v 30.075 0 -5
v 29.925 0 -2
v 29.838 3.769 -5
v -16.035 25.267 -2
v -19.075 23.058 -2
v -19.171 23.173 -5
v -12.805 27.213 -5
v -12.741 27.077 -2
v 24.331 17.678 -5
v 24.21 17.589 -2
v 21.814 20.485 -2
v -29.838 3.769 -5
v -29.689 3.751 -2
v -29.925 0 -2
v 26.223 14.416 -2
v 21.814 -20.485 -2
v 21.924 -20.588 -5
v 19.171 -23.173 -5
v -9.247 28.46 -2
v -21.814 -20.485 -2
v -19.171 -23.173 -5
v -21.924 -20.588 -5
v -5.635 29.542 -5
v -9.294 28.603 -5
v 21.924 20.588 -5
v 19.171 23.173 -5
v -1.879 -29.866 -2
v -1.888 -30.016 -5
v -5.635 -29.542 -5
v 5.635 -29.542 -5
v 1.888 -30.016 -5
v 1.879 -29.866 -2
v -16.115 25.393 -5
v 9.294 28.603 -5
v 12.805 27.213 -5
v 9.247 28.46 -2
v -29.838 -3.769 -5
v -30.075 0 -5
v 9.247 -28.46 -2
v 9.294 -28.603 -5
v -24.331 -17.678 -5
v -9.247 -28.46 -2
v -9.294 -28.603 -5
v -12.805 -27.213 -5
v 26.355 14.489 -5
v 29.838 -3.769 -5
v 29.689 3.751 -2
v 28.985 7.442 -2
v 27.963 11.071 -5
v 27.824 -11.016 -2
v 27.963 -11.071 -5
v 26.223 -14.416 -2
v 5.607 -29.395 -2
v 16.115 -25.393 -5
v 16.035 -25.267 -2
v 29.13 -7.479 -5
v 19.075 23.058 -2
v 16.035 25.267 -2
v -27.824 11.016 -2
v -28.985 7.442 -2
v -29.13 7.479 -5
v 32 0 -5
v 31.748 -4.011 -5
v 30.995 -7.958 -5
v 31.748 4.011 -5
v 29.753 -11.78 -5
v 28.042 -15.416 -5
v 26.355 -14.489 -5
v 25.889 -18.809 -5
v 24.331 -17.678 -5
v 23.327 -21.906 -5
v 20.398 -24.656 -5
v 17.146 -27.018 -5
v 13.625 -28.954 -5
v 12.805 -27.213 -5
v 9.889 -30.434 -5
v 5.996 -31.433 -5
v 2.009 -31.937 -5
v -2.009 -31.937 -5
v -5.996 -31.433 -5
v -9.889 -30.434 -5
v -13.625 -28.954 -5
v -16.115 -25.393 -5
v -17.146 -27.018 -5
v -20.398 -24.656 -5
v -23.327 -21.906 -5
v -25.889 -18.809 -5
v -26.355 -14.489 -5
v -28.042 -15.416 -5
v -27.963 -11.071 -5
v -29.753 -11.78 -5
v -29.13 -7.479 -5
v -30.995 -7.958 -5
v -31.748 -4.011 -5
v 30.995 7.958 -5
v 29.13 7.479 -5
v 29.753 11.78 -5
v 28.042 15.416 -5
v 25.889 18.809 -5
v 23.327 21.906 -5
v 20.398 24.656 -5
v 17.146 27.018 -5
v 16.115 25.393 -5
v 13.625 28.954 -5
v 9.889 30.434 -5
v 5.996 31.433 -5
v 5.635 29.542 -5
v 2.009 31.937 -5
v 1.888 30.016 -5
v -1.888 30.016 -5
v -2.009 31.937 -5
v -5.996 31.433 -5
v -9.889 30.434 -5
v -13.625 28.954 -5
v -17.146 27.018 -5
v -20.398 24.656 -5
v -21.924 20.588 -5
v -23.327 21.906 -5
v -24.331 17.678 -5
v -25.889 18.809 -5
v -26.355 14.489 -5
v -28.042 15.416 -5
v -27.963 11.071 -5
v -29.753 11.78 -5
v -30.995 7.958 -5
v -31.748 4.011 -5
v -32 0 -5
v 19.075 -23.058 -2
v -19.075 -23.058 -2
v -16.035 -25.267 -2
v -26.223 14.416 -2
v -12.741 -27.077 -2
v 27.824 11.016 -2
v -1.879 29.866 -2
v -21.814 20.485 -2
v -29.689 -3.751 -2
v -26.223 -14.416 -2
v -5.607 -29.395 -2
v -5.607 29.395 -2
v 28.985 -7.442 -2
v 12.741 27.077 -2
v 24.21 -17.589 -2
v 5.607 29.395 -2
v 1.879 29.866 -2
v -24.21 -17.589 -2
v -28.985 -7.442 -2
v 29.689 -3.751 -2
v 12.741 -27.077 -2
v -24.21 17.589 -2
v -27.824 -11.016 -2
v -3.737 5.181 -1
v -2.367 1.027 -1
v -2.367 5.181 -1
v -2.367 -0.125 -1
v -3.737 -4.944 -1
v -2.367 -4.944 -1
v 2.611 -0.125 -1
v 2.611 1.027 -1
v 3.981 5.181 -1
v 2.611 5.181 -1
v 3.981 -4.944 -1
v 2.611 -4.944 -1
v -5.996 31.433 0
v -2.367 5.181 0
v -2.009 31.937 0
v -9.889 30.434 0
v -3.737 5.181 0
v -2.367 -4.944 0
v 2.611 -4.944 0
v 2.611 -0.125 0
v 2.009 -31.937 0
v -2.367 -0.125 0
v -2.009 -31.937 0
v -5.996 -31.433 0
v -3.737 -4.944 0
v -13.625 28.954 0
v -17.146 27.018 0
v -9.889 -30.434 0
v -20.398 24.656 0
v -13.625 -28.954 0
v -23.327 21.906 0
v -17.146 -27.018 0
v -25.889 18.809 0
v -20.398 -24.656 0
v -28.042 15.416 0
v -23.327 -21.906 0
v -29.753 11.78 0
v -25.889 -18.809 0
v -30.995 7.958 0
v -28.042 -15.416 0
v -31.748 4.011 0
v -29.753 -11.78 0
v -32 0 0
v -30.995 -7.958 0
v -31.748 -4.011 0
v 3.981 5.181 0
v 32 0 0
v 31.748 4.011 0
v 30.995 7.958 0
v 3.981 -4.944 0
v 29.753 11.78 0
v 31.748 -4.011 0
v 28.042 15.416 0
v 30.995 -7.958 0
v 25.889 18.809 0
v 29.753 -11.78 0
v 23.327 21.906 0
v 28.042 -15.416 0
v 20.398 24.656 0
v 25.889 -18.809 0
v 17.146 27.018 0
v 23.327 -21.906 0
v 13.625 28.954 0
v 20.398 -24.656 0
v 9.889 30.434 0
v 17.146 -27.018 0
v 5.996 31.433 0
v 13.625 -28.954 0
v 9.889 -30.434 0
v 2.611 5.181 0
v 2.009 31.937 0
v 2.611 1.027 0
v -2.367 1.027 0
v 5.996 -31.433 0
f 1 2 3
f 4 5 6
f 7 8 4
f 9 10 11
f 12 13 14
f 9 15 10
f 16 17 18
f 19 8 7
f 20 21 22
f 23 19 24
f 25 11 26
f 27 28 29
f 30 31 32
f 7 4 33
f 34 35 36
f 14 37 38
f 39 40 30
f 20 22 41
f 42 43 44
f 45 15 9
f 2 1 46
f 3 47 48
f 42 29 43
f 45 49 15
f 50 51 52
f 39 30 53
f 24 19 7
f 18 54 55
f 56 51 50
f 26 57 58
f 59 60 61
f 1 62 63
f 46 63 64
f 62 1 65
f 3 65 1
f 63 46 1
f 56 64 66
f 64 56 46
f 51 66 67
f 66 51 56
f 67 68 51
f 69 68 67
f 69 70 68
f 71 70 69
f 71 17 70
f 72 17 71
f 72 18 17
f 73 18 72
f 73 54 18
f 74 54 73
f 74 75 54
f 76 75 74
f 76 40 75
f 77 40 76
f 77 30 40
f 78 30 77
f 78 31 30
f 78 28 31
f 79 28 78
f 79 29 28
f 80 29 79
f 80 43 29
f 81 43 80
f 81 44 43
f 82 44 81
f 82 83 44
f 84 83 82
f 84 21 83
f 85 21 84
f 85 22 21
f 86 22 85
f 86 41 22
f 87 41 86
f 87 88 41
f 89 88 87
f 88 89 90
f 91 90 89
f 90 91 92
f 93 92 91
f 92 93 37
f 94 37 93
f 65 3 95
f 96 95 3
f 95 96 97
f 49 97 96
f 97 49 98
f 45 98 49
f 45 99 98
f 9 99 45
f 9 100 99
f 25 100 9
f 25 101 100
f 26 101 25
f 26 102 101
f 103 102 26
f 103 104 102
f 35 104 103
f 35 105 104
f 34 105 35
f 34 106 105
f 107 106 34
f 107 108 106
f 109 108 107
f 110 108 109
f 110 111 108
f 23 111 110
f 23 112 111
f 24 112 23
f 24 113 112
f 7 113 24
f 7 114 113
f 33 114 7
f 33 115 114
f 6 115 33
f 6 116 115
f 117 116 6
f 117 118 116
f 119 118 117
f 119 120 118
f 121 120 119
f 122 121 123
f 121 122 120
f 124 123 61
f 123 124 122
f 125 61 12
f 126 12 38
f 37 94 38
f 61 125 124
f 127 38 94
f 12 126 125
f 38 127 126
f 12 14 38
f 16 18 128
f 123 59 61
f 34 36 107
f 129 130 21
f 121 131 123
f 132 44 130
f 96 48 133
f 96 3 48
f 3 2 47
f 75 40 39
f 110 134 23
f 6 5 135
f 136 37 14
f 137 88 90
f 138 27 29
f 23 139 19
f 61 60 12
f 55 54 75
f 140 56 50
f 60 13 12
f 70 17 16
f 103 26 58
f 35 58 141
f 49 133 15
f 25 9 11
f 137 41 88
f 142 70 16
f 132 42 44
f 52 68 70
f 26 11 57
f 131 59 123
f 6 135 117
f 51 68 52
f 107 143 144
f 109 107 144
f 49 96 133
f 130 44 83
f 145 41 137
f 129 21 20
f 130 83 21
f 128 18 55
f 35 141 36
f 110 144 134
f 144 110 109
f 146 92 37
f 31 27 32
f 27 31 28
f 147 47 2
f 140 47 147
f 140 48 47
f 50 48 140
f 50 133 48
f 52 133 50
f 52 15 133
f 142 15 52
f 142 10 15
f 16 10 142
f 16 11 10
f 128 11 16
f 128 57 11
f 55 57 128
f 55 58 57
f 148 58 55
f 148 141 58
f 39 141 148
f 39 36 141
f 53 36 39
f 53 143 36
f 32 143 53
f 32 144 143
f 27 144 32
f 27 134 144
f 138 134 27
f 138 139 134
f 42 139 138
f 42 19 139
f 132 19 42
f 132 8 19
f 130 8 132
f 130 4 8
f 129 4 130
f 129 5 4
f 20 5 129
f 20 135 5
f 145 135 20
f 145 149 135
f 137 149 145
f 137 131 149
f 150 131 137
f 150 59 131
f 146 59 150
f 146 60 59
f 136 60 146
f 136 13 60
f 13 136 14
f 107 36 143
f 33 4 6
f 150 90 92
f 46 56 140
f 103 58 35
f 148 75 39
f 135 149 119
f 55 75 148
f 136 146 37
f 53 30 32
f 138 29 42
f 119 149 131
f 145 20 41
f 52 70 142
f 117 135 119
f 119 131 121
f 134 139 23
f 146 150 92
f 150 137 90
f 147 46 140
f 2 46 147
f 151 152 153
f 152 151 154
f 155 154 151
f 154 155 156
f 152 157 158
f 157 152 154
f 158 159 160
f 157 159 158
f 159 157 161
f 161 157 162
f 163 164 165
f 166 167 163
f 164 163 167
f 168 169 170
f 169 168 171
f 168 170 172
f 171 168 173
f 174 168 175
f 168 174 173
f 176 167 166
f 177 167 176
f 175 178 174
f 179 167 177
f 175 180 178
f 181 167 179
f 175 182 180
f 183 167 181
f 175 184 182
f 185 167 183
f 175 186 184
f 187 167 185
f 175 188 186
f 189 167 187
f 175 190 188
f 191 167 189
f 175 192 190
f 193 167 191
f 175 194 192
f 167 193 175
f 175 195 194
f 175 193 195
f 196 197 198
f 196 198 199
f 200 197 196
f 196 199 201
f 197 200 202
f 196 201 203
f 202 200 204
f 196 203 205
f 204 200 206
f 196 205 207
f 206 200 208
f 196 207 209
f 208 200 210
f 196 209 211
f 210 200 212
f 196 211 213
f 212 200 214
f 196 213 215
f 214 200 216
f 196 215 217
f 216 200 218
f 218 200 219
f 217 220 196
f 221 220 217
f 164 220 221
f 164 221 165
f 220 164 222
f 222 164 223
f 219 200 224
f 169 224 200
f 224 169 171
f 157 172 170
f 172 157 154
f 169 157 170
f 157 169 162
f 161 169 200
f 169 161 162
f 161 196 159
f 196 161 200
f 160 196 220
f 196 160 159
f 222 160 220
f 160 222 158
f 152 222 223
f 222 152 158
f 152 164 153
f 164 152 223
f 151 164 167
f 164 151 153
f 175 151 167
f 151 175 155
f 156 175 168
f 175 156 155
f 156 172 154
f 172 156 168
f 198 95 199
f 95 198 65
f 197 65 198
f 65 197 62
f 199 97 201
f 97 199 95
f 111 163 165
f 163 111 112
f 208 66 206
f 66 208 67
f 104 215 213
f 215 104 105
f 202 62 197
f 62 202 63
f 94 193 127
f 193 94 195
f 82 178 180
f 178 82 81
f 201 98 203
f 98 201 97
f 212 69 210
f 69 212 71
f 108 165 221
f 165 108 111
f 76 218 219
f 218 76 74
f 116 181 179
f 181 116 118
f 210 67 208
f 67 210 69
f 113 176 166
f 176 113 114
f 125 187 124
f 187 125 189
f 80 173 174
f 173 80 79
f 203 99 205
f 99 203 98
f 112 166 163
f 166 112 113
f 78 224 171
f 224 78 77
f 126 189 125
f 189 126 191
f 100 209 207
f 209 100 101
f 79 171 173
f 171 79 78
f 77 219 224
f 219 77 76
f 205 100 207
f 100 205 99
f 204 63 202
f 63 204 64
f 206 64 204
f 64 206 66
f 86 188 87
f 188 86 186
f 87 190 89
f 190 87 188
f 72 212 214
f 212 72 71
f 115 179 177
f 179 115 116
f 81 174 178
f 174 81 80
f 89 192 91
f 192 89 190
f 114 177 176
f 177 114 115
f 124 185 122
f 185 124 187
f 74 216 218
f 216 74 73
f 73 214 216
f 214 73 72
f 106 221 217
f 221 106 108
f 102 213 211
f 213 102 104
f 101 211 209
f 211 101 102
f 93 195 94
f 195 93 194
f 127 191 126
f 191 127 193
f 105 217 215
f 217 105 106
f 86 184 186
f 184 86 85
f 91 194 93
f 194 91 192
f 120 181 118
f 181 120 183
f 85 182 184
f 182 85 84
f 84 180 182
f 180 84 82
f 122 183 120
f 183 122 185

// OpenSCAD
$fn = 50;

difference() {
	union() {
		translate(v = [0, 0, -5.0]) {
			cylinder(h = 5, r = 32.0);
		}
	}
	union() {
		#translate(v = [0, 0, -5.0]) {
			cylinder(h = 3, r1 = 30.075, r2 = 29.925);
		}
		translate(v = [0, 0, -1]) {
			linear_extrude(height = 1) {
				text(font = "Impact", halign = "center", size = 10, text = "H", valign = "center");
			}
		}
	}
}
